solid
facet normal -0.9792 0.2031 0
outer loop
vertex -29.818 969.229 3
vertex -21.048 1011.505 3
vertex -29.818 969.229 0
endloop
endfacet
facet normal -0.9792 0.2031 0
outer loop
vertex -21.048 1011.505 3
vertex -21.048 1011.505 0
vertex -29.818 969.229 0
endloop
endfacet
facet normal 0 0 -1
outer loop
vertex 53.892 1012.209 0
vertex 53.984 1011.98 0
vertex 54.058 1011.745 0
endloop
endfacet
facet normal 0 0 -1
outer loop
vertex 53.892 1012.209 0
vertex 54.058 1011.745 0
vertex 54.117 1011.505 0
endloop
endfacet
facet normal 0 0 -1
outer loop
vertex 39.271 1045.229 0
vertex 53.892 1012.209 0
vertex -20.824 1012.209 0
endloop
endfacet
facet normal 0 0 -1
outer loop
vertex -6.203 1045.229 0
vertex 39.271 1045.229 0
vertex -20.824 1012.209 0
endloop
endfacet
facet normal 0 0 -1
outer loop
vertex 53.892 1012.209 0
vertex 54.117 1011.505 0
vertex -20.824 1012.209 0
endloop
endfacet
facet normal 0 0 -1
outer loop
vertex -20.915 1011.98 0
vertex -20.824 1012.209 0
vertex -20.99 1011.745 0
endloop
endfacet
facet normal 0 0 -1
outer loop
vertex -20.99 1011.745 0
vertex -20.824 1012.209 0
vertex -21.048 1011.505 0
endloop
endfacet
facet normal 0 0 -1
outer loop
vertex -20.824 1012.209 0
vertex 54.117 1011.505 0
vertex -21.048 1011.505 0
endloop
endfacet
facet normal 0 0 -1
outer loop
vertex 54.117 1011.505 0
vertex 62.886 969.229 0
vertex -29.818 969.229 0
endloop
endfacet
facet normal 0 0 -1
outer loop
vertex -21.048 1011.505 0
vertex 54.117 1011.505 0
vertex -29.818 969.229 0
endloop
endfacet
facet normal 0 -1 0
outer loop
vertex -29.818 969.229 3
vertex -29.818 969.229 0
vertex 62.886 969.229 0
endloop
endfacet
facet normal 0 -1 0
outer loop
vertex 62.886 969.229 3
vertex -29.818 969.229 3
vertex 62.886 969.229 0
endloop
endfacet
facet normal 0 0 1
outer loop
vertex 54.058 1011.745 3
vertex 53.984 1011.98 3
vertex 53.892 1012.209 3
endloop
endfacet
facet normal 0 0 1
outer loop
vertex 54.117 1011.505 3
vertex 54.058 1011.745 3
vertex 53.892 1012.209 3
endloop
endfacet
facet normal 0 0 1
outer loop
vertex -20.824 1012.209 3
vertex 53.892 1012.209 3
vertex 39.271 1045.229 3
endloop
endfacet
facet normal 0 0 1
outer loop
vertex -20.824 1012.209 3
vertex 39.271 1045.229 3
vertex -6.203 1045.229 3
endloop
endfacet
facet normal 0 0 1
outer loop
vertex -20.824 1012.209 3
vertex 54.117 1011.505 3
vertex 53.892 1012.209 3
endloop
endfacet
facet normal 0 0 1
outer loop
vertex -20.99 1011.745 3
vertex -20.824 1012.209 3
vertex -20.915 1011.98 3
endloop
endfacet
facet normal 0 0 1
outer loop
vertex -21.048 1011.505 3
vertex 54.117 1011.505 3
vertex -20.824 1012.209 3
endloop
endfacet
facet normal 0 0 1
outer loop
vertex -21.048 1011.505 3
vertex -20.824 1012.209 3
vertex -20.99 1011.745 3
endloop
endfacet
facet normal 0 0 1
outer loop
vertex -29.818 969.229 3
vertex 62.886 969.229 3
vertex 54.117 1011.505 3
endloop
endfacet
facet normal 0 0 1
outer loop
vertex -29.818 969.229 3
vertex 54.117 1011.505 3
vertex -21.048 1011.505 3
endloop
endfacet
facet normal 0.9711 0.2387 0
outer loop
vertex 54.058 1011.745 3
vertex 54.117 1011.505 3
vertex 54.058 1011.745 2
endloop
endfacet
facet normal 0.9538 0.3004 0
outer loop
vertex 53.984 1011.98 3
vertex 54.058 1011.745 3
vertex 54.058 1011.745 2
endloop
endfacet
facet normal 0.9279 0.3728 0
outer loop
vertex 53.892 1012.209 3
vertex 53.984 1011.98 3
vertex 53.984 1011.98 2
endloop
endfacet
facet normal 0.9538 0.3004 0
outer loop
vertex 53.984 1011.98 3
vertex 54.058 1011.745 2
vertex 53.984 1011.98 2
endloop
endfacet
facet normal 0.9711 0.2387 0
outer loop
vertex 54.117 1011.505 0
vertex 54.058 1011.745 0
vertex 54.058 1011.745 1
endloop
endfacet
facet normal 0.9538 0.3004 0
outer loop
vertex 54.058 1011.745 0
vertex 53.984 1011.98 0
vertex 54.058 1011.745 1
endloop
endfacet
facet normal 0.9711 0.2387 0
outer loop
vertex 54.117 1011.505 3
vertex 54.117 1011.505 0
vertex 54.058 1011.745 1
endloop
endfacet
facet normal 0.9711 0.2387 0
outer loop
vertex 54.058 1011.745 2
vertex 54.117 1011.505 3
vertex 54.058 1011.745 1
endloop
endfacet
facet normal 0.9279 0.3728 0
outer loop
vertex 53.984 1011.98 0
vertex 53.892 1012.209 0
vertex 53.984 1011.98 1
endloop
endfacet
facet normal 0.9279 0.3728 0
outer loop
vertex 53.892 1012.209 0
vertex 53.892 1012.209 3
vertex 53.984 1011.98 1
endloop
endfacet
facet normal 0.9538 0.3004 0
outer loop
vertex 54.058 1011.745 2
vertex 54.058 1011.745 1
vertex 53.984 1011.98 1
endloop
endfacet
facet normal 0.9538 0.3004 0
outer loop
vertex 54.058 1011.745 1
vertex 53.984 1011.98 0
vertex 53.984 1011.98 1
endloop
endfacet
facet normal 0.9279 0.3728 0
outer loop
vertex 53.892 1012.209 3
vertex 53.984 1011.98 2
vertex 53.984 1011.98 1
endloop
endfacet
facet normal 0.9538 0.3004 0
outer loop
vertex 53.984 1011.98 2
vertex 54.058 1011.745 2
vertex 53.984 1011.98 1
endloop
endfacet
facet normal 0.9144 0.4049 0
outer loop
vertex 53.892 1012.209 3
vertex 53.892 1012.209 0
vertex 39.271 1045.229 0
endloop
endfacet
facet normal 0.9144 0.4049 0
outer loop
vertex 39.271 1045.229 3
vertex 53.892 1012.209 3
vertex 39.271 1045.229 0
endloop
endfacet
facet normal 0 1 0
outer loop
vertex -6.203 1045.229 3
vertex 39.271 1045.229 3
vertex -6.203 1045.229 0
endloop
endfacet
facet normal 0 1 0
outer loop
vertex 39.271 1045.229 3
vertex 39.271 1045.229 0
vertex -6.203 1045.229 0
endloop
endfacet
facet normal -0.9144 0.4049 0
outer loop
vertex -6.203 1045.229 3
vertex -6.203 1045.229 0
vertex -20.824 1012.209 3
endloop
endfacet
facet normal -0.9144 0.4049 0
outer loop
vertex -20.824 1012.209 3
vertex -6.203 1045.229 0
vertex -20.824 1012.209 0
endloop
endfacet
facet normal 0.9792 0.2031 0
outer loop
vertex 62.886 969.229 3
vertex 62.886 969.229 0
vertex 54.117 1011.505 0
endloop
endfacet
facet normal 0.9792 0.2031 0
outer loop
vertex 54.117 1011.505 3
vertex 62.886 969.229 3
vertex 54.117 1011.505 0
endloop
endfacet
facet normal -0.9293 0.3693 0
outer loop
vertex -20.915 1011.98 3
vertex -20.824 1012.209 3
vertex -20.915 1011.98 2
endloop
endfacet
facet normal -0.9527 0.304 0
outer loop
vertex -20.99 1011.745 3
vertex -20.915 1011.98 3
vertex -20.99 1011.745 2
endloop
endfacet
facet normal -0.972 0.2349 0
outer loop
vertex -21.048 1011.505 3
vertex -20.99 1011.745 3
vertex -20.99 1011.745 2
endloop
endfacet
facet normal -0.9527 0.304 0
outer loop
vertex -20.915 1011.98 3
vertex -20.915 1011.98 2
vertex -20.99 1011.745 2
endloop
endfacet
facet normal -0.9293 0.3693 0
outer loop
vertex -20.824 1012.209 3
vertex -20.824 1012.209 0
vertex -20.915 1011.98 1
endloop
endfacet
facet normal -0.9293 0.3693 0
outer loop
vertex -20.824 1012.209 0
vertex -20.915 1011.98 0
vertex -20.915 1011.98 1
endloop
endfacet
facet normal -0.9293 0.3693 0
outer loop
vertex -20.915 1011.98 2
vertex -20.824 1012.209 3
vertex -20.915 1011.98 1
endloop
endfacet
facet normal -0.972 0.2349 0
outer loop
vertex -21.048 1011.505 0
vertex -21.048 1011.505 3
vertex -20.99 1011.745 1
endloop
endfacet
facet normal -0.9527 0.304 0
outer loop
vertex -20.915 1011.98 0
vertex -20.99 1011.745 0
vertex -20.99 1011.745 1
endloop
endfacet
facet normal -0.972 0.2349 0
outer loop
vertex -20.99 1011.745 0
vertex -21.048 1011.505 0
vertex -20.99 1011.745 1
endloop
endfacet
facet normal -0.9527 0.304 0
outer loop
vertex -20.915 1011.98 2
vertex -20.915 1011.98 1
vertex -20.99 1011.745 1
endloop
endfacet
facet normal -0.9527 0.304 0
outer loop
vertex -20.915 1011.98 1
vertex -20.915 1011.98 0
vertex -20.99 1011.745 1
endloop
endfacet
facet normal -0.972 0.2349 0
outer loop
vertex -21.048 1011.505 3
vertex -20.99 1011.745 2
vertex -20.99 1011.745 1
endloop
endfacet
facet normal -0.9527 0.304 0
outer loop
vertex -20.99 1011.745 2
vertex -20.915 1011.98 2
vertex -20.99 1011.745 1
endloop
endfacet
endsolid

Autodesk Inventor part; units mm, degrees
ref_plane "YZ Plane" through (0, 0, 0) normal (1, 0, 0) x (0, 1, 0)
ref_plane "XZ Plane" through (0, 0, 0) normal (0, 1, 0) x (-1, 0, 0)
ref_plane "Work Plane1" through (16.5341, 952.9567, 0) normal (0, 0, 1) x (-1, 0, 0)
sketch "Sketch1" plane through (16.5341, 952.9567, 0) normal (0, 0, 1) x (-1, 0, 0)
  line L0 (60, 40.2719) -> (60, 137.1193)
  ellipse E0 centre (56, 137.1193) end of major axis (56, 141.9614) minor radius 4 (60, 137.1193) -> (56, 141.9614) ccw
  line L1 (56, 141.9614) -> (24.75, 141.9614)
  line L2 (24.75, 141.9614) -> (24.75, 144.3824)
  line L3 (24.75, 144.3824) -> (24.75, 146.8034)
  line L4 (24.75, 146.8034) -> (56, 146.8034)
  ellipse E1 centre (56, 137.1193) end of major axis (56, 146.8034) minor radius 8 (64, 137.1193) -> (56, 146.8034) ccw
  line L5 (64, 137.1193) -> (64, 40.2719)
  ellipse E2 centre (56, 40.2719) end of major axis (56, 30.5879) minor radius 8 (63.7591, 37.9134) -> (64, 40.2719) ccw
  line L6 (63.7591, 37.9134) -> (43.4204, -60.1335)
  ellipse E3 centre (35.6613, -57.775) end of major axis (35.6613, -67.459) minor radius 8 (42.7123, -62.3499) -> (43.4204, -60.1335) ccw
  line L7 (42.7123, -62.3499) -> (7.051, -142.8866)
  ellipse E4 centre (0, -138.3116) end of major axis (0, -147.9957) minor radius 8 (-7.051, -142.8866) -> (7.051, -142.8866) ccw
  line L8 (-7.051, -142.8866) -> (-42.7123, -62.3499)
  ellipse E5 centre (-35.6613, -57.775) end of major axis (-35.6613, -67.459) minor radius 8 (-43.4204, -60.1335) -> (-42.7123, -62.3499) ccw
  line L9 (-43.4204, -60.1335) -> (-63.7591, 37.9134)
  ellipse E6 centre (-56, 40.2719) end of major axis (-56, 30.5879) minor radius 8 (-64, 40.2719) -> (-63.7591, 37.9134) ccw
  line L10 (-64, 40.2719) -> (-64, 137.1193)
  ellipse E7 centre (-56, 137.1193) end of major axis (-56, 146.8034) minor radius 8 (-56, 146.8034) -> (-64, 137.1193) ccw
  line L11 (-56, 146.8034) -> (-24.75, 146.8034)
  line L12 (-24.75, 146.8034) -> (-24.75, 144.3824)
  line L13 (-24.75, 144.3824) -> (-24.75, 141.9614)
  line L14 (-24.75, 141.9614) -> (-56, 141.9614)
  ellipse E8 centre (-56, 137.1193) end of major axis (-56, 141.9614) minor radius 4 (-56, 141.9614) -> (-60, 137.1193) ccw
  line L15 (-60, 137.1193) -> (-60, 40.2719)
  ellipse E9 centre (-56, 40.2719) end of major axis (-56, 35.4299) minor radius 4 (-60, 40.2719) -> (-59.8796, 39.0927) ccw
  line L16 (-59.8796, 39.0927) -> (-39.5409, -58.9542)
  ellipse E10 centre (-35.6613, -57.775) end of major axis (-35.6613, -62.617) minor radius 4 (-39.5409, -58.9542) -> (-39.1868, -60.0624) ccw
  line L17 (-39.1868, -60.0624) -> (-3.5255, -140.5991)
  ellipse E11 centre (0, -138.3116) end of major axis (0, -143.1536) minor radius 4 (-3.5255, -140.5991) -> (3.5255, -140.5991) ccw
  line L18 (3.5255, -140.5991) -> (39.1868, -60.0624)
  ellipse E12 centre (35.6613, -57.775) end of major axis (35.6613, -62.617) minor radius 4 (39.1868, -60.0624) -> (39.5409, -58.9542) ccw
  line L19 (39.5409, -58.9542) -> (59.8796, 39.0927)
  ellipse E13 centre (56, 40.2719) end of major axis (56, 35.4299) minor radius 4 (59.8796, 39.0927) -> (60, 40.2719) ccw
  line L20 (-24.75, 141.9614) -> (24.75, 141.9614)
  line L21 (-24.0389, -94.2722) -> (24.0389, -94.2722)
  line L22 (-48.8096, -14.2722) -> (48.8096, -14.2722)
  point P0 (16.5341, 952.9567)
  point P1 (60, -19.5271)
  dimension "d3" = 88.0788
  dimension "d4" = 44.0394
  dimension "d12" = 80
extrude "Plate1" add sketch "Sketch1" along normal blind 3 contours L19 E12 L18 L21 L17 E10 L16 L22
ref_plane "modplan parallel med plade" through (16.5341, 952.9567, 1.5) normal (0, 0, 1) x (1, 0, 0)
sketch "Sketch3" plane through (16.5341, 952.9567, 0) normal (0, 0, -1) x (-1, 0, 0)
  ellipse E0 centre (-35.6613, 57.775) end of major axis (-35.6613, 62.617) minor radius 4 (-39.1868, 60.0624) -> (-39.5409, 58.9542) ccw projected
  line L0 (-48.8096, 14.2722) -> (-39.5409, 58.9542) projected
  line L1 (48.8096, 14.2722) -> (-48.8096, 14.2722) projected
  line L2 (39.5409, 58.9542) -> (48.8096, 14.2722) projected
  ellipse E1 centre (35.6613, 57.775) end of major axis (35.6613, 62.617) minor radius 4 (39.5409, 58.9542) -> (39.1868, 60.0624) ccw projected
  line L3 (24.0389, 94.2722) -> (39.1868, 60.0624) projected
  line L4 (-24.0389, 94.2722) -> (24.0389, 94.2722) projected
  line L5 (-39.1868, 60.0624) -> (-24.0389, 94.2722) projected
  line L6 (-37.3581, 59.2527) -> (-22.7372, 92.2722)
  line L7 (-22.7372, 92.2722) -> (22.7372, 92.2722)
  line L8 (22.7372, 92.2722) -> (37.3581, 59.2527)
  line L9 (37.5826, 58.548) -> (46.3522, 16.2722)
  line L10 (46.3522, 16.2722) -> (-46.3522, 16.2722)
  line L11 (-46.3522, 16.2722) -> (-37.5826, 58.548)
  spline S0 degree 3 poles (-37.5826, 58.548) (-37.5324, 58.7898) (-37.4581, 59.0268) (-37.3581, 59.2527) knots 0 0 0 0 1 1 1 1
  spline S1 degree 3 poles (37.3581, 59.2527) (37.4581, 59.0268) (37.5324, 58.7898) (37.5826, 58.548) knots 0 0 0 0 1 1 1 1
  point P0 (16.5341, -952.9567)
  dimension "d14" = 2
extrude "2 mm mindre" cut sketch "Sketch3" against normal blind 3
ref_plane "midtplan" through (16.5341, 1192.6796, 0) normal (-1, 0, 0) x (0, 0, 1)
equation "\"d4\" = 0.5 * d3"
equation "\"d15\" = Thickness"
equation "\"d8\" = Thickness"
equation "\"Thickness\" = pladetykkelse"
equation "\"BendRadius\" = Thickness"
equation "\"BendReliefWidth\" = Thickness"
equation "\"BendReliefDepth\" = 0.5 * Thickness"
equation "\"CornerReliefSize\" = 4 * Thickness"
equation "\"MinimumRemnant\" = 2 * Thickness"
equation "\"TransitionRadius\" = BendRadius"
equation "\"JacobiRadiusSize\" = BendRadius"
equation "\"GapSize\" = Thickness"
equation "\"pladetykkelse\" = 3"
equation "\"trappevinkel\" = 34.3deg"
equation "\"trappestifter_dia\" = 25"
equation "\"trappestifter_huldia\" = 25.8"
equation "\"trappestifter_skraa_huldia\" = 26.6"
equation "\"trappestifter_laengde\" = 228"
equation "\"perforeringsbredde\" = 6"
equation "\"perforeringshullaengde\" = 62.8"
equation "\"perforeringshullaengde_top\" = 61"
equation "\"perforeringshullaengde_bund\" = 61.6"
equation "\"perforeringsoffset\" = 8"
equation "\"perforeringsoffset_top\" = 8"
equation "\"perforeringsoffset_bund\" = 8"
equation "\"laskehul_dia\" = 13"
equation "\"balusterhul_udvidelse\" = 1"
equation "\"trinbredde\" = 1884"
properties part number "skot" material "S355MC"
